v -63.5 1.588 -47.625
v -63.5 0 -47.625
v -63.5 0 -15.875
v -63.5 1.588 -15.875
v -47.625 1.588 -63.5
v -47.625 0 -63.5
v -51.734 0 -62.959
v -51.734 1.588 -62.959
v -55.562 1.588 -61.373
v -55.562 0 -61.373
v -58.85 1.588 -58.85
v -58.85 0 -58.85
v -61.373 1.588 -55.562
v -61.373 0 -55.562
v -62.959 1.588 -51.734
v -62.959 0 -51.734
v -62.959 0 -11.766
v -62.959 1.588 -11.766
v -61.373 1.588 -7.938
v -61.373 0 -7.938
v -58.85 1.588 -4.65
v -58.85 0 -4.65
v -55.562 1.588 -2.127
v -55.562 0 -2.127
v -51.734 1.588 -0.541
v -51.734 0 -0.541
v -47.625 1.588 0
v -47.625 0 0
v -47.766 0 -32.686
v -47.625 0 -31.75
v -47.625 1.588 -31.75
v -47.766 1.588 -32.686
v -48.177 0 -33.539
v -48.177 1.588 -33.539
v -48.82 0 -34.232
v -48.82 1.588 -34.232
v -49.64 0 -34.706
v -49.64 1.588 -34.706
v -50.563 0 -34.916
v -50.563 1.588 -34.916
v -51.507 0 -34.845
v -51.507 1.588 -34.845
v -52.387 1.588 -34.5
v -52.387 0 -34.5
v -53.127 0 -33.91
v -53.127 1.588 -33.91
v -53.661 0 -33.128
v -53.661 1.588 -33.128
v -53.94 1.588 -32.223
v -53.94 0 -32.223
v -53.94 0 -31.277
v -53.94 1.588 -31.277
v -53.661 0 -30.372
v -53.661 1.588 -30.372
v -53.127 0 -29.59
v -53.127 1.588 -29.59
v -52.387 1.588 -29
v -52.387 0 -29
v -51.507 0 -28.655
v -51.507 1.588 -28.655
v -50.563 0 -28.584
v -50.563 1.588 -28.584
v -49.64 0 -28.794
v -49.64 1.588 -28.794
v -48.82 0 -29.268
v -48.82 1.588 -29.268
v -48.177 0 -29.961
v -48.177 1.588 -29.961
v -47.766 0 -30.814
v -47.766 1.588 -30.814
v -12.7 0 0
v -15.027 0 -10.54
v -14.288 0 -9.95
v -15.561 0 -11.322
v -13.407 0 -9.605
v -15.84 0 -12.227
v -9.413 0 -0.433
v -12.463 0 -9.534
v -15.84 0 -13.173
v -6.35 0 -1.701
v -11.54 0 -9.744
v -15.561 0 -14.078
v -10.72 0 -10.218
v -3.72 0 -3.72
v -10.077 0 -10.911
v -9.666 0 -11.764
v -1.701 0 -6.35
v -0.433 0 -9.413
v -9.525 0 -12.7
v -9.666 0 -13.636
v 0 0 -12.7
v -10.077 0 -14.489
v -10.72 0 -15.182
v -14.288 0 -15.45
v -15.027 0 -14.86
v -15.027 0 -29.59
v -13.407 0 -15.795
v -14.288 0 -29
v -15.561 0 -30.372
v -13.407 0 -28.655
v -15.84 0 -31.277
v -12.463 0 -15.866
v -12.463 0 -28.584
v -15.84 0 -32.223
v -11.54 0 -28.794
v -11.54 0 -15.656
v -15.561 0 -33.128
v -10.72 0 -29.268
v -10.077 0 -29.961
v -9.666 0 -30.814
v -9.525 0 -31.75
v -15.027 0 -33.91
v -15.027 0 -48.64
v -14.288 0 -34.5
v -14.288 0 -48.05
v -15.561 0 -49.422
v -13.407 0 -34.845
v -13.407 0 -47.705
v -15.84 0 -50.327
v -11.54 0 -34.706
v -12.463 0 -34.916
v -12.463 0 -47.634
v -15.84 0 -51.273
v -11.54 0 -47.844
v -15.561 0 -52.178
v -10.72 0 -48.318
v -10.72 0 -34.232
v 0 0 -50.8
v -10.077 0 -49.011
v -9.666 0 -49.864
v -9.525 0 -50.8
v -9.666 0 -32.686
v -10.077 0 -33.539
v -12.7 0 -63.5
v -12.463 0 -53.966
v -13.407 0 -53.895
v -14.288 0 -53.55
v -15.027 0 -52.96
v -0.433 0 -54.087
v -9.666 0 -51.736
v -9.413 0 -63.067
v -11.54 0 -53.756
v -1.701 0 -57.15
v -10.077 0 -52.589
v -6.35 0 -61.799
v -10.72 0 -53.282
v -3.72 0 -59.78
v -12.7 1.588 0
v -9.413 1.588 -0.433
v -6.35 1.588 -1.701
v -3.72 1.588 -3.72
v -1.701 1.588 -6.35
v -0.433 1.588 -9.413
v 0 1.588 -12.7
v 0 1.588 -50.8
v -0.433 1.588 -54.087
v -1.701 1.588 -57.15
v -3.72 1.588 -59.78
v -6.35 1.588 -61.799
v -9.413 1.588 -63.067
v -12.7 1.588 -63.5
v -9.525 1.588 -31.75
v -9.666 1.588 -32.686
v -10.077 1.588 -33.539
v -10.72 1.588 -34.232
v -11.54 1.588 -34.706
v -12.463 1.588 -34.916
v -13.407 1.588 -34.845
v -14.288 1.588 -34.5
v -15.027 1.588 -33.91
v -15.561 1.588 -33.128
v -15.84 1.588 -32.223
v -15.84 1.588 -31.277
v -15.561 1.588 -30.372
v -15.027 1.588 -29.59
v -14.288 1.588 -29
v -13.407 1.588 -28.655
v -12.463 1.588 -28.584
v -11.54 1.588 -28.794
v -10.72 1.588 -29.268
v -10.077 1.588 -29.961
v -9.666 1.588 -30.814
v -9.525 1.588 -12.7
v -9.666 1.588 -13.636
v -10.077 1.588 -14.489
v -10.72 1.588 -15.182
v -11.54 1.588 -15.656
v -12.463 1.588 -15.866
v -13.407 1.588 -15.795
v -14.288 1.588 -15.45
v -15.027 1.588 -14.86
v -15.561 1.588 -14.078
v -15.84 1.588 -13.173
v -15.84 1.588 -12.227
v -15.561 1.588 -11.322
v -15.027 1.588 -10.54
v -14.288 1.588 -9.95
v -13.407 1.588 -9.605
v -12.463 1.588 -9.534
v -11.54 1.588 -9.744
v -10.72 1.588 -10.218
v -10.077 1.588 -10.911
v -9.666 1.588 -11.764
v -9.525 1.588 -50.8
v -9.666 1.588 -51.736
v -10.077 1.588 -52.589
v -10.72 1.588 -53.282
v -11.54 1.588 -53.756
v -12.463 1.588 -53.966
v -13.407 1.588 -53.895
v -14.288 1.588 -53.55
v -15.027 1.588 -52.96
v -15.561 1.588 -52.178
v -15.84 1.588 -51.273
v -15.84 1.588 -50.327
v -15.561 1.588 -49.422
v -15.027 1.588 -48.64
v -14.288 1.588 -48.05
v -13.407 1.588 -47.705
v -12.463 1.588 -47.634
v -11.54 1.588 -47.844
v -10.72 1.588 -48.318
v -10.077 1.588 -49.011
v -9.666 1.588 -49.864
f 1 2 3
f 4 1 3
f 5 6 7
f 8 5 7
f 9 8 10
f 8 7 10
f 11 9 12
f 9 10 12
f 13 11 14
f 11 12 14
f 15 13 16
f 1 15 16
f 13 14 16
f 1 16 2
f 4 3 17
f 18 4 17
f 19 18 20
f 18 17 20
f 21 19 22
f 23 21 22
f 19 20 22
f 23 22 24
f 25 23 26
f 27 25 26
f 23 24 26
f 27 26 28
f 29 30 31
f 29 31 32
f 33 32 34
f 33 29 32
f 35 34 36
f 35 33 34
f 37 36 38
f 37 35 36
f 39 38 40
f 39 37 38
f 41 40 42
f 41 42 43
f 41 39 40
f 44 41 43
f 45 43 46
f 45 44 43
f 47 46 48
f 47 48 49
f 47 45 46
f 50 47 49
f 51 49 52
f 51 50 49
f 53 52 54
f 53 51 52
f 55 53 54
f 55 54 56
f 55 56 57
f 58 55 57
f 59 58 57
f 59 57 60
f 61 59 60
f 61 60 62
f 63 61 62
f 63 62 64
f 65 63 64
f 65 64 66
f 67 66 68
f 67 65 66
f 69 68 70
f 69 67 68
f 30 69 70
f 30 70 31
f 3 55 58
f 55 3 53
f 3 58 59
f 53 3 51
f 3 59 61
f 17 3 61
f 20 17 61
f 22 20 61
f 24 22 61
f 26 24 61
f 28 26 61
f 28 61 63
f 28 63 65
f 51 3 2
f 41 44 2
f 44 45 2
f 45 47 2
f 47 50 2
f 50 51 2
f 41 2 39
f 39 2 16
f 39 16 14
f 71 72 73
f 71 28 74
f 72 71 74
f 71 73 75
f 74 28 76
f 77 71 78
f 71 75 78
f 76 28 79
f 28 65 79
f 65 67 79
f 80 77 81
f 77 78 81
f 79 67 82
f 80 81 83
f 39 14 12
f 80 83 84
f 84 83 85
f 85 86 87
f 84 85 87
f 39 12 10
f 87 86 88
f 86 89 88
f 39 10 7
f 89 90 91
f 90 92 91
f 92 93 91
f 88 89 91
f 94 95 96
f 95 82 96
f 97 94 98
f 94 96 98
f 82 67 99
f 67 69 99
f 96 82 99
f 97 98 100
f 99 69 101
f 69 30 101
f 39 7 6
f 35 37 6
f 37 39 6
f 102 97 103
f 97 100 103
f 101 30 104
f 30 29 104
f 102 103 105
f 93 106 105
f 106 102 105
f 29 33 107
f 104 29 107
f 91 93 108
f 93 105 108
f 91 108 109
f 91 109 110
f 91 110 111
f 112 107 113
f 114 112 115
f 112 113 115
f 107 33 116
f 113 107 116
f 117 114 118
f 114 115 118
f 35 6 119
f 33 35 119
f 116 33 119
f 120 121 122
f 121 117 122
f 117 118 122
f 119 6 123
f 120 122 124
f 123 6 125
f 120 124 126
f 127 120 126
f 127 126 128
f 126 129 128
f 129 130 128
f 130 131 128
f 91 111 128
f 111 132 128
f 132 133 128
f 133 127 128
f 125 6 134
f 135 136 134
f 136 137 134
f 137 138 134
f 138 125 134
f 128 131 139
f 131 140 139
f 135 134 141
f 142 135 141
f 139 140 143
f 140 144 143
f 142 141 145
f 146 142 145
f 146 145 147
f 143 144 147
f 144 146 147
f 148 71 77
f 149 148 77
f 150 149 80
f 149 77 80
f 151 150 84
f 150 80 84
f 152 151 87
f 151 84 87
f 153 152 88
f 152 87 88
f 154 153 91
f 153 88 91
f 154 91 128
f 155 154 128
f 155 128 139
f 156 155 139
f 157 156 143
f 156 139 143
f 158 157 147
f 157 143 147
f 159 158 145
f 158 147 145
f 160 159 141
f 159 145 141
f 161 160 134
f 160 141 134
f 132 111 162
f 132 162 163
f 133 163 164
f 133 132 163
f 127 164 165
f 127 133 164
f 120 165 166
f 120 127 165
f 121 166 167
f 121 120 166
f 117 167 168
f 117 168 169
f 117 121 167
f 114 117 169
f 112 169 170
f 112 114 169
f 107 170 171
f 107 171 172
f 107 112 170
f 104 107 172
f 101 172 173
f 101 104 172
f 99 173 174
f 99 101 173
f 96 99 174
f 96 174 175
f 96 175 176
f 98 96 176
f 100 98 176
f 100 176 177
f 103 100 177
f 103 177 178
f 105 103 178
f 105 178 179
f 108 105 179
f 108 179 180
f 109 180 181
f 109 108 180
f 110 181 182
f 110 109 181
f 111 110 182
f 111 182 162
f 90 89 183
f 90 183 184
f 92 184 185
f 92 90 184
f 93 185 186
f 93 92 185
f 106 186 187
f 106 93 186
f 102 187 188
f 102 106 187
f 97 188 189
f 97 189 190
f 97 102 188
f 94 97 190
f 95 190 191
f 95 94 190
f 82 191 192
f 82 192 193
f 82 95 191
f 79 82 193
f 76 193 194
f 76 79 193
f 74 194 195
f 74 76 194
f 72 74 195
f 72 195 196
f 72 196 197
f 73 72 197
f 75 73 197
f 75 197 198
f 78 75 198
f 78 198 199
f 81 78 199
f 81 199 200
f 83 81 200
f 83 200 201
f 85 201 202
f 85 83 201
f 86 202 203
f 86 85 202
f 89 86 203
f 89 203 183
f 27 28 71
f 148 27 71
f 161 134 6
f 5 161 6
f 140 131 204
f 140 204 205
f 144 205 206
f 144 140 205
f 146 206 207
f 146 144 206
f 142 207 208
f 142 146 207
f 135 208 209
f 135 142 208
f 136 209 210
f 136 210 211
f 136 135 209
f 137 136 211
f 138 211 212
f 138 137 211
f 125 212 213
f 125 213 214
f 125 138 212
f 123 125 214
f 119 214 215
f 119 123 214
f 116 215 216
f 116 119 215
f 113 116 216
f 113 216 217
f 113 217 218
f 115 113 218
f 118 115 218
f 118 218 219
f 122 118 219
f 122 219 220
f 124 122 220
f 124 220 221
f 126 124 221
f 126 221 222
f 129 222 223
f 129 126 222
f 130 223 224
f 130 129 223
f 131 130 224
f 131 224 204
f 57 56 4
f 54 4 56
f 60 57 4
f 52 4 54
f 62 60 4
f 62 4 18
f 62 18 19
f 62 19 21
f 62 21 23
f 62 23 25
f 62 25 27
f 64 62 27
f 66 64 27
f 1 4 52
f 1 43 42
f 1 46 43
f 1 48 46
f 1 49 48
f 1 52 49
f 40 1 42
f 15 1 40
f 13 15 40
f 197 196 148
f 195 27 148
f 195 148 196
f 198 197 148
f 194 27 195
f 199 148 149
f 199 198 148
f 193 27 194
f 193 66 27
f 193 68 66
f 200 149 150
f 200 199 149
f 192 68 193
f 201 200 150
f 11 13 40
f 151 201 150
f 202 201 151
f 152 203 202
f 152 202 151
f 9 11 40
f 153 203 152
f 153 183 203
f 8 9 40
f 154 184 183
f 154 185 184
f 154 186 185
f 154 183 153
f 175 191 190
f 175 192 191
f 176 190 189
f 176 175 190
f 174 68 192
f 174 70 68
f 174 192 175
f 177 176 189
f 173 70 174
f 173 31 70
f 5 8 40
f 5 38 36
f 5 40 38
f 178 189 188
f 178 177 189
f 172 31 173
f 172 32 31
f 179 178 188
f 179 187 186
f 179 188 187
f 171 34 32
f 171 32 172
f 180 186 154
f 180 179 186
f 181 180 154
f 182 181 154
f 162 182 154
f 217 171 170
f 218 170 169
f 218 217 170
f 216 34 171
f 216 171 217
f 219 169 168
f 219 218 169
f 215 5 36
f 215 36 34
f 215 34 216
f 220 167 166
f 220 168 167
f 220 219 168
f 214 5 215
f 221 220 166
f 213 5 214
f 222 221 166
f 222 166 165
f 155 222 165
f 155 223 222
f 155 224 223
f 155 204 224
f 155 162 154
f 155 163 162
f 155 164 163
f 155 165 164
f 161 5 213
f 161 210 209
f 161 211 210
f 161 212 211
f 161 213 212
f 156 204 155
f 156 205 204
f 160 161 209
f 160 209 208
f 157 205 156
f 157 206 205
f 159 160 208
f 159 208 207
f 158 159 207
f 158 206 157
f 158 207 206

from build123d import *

# Parameters (mm, degrees)
SKETCH1_R           = 3.175
BOSS_EXTRUDE1_DEPTH = 1.5875


with BuildPart() as part:
    # Sketch1 → Boss-Extrude1 (new body)
    with BuildSketch(Plane(origin=(0, 0, 0), x_dir=(1, 0, 0), z_dir=(0, 1, 0))):
        with BuildLine():
            Line((-47.625, 0), (-12.7, 0))
            ThreePointArc((-12.7, 0), (-3.719743879, 3.719743879), (0, 12.7))
            Line((0, 12.7), (0, 50.8))
            ThreePointArc((0, 50.8), (-3.719743879, 59.780256121), (-12.7, 63.5))
            Line((-12.7, 63.5), (-47.625, 63.5))
            ThreePointArc((-47.625, 63.5), (-58.850320151, 58.850320151), (-63.5, 47.625))
            Line((-63.5, 47.625), (-63.5, 44.45))
            Line((-63.5, 44.45), (-63.5, 19.05))
            Line((-63.5, 19.05), (-63.5, 15.875))
            ThreePointArc((-63.5, 15.875), (-58.850320151, 4.649679849), (-47.625, 0))
        make_face()
        with Locations((-12.7, 12.7)):
            Circle(SKETCH1_R, mode=Mode.SUBTRACT)
        with Locations((-50.8, 31.75)):
            Circle(SKETCH1_R, mode=Mode.SUBTRACT)
        with Locations((-12.7, 31.75)):
            Circle(SKETCH1_R, mode=Mode.SUBTRACT)
        with Locations((-12.7, 50.8)):
            Circle(SKETCH1_R, mode=Mode.SUBTRACT)
    extrude(amount=BOSS_EXTRUDE1_DEPTH)


solid = part.part
